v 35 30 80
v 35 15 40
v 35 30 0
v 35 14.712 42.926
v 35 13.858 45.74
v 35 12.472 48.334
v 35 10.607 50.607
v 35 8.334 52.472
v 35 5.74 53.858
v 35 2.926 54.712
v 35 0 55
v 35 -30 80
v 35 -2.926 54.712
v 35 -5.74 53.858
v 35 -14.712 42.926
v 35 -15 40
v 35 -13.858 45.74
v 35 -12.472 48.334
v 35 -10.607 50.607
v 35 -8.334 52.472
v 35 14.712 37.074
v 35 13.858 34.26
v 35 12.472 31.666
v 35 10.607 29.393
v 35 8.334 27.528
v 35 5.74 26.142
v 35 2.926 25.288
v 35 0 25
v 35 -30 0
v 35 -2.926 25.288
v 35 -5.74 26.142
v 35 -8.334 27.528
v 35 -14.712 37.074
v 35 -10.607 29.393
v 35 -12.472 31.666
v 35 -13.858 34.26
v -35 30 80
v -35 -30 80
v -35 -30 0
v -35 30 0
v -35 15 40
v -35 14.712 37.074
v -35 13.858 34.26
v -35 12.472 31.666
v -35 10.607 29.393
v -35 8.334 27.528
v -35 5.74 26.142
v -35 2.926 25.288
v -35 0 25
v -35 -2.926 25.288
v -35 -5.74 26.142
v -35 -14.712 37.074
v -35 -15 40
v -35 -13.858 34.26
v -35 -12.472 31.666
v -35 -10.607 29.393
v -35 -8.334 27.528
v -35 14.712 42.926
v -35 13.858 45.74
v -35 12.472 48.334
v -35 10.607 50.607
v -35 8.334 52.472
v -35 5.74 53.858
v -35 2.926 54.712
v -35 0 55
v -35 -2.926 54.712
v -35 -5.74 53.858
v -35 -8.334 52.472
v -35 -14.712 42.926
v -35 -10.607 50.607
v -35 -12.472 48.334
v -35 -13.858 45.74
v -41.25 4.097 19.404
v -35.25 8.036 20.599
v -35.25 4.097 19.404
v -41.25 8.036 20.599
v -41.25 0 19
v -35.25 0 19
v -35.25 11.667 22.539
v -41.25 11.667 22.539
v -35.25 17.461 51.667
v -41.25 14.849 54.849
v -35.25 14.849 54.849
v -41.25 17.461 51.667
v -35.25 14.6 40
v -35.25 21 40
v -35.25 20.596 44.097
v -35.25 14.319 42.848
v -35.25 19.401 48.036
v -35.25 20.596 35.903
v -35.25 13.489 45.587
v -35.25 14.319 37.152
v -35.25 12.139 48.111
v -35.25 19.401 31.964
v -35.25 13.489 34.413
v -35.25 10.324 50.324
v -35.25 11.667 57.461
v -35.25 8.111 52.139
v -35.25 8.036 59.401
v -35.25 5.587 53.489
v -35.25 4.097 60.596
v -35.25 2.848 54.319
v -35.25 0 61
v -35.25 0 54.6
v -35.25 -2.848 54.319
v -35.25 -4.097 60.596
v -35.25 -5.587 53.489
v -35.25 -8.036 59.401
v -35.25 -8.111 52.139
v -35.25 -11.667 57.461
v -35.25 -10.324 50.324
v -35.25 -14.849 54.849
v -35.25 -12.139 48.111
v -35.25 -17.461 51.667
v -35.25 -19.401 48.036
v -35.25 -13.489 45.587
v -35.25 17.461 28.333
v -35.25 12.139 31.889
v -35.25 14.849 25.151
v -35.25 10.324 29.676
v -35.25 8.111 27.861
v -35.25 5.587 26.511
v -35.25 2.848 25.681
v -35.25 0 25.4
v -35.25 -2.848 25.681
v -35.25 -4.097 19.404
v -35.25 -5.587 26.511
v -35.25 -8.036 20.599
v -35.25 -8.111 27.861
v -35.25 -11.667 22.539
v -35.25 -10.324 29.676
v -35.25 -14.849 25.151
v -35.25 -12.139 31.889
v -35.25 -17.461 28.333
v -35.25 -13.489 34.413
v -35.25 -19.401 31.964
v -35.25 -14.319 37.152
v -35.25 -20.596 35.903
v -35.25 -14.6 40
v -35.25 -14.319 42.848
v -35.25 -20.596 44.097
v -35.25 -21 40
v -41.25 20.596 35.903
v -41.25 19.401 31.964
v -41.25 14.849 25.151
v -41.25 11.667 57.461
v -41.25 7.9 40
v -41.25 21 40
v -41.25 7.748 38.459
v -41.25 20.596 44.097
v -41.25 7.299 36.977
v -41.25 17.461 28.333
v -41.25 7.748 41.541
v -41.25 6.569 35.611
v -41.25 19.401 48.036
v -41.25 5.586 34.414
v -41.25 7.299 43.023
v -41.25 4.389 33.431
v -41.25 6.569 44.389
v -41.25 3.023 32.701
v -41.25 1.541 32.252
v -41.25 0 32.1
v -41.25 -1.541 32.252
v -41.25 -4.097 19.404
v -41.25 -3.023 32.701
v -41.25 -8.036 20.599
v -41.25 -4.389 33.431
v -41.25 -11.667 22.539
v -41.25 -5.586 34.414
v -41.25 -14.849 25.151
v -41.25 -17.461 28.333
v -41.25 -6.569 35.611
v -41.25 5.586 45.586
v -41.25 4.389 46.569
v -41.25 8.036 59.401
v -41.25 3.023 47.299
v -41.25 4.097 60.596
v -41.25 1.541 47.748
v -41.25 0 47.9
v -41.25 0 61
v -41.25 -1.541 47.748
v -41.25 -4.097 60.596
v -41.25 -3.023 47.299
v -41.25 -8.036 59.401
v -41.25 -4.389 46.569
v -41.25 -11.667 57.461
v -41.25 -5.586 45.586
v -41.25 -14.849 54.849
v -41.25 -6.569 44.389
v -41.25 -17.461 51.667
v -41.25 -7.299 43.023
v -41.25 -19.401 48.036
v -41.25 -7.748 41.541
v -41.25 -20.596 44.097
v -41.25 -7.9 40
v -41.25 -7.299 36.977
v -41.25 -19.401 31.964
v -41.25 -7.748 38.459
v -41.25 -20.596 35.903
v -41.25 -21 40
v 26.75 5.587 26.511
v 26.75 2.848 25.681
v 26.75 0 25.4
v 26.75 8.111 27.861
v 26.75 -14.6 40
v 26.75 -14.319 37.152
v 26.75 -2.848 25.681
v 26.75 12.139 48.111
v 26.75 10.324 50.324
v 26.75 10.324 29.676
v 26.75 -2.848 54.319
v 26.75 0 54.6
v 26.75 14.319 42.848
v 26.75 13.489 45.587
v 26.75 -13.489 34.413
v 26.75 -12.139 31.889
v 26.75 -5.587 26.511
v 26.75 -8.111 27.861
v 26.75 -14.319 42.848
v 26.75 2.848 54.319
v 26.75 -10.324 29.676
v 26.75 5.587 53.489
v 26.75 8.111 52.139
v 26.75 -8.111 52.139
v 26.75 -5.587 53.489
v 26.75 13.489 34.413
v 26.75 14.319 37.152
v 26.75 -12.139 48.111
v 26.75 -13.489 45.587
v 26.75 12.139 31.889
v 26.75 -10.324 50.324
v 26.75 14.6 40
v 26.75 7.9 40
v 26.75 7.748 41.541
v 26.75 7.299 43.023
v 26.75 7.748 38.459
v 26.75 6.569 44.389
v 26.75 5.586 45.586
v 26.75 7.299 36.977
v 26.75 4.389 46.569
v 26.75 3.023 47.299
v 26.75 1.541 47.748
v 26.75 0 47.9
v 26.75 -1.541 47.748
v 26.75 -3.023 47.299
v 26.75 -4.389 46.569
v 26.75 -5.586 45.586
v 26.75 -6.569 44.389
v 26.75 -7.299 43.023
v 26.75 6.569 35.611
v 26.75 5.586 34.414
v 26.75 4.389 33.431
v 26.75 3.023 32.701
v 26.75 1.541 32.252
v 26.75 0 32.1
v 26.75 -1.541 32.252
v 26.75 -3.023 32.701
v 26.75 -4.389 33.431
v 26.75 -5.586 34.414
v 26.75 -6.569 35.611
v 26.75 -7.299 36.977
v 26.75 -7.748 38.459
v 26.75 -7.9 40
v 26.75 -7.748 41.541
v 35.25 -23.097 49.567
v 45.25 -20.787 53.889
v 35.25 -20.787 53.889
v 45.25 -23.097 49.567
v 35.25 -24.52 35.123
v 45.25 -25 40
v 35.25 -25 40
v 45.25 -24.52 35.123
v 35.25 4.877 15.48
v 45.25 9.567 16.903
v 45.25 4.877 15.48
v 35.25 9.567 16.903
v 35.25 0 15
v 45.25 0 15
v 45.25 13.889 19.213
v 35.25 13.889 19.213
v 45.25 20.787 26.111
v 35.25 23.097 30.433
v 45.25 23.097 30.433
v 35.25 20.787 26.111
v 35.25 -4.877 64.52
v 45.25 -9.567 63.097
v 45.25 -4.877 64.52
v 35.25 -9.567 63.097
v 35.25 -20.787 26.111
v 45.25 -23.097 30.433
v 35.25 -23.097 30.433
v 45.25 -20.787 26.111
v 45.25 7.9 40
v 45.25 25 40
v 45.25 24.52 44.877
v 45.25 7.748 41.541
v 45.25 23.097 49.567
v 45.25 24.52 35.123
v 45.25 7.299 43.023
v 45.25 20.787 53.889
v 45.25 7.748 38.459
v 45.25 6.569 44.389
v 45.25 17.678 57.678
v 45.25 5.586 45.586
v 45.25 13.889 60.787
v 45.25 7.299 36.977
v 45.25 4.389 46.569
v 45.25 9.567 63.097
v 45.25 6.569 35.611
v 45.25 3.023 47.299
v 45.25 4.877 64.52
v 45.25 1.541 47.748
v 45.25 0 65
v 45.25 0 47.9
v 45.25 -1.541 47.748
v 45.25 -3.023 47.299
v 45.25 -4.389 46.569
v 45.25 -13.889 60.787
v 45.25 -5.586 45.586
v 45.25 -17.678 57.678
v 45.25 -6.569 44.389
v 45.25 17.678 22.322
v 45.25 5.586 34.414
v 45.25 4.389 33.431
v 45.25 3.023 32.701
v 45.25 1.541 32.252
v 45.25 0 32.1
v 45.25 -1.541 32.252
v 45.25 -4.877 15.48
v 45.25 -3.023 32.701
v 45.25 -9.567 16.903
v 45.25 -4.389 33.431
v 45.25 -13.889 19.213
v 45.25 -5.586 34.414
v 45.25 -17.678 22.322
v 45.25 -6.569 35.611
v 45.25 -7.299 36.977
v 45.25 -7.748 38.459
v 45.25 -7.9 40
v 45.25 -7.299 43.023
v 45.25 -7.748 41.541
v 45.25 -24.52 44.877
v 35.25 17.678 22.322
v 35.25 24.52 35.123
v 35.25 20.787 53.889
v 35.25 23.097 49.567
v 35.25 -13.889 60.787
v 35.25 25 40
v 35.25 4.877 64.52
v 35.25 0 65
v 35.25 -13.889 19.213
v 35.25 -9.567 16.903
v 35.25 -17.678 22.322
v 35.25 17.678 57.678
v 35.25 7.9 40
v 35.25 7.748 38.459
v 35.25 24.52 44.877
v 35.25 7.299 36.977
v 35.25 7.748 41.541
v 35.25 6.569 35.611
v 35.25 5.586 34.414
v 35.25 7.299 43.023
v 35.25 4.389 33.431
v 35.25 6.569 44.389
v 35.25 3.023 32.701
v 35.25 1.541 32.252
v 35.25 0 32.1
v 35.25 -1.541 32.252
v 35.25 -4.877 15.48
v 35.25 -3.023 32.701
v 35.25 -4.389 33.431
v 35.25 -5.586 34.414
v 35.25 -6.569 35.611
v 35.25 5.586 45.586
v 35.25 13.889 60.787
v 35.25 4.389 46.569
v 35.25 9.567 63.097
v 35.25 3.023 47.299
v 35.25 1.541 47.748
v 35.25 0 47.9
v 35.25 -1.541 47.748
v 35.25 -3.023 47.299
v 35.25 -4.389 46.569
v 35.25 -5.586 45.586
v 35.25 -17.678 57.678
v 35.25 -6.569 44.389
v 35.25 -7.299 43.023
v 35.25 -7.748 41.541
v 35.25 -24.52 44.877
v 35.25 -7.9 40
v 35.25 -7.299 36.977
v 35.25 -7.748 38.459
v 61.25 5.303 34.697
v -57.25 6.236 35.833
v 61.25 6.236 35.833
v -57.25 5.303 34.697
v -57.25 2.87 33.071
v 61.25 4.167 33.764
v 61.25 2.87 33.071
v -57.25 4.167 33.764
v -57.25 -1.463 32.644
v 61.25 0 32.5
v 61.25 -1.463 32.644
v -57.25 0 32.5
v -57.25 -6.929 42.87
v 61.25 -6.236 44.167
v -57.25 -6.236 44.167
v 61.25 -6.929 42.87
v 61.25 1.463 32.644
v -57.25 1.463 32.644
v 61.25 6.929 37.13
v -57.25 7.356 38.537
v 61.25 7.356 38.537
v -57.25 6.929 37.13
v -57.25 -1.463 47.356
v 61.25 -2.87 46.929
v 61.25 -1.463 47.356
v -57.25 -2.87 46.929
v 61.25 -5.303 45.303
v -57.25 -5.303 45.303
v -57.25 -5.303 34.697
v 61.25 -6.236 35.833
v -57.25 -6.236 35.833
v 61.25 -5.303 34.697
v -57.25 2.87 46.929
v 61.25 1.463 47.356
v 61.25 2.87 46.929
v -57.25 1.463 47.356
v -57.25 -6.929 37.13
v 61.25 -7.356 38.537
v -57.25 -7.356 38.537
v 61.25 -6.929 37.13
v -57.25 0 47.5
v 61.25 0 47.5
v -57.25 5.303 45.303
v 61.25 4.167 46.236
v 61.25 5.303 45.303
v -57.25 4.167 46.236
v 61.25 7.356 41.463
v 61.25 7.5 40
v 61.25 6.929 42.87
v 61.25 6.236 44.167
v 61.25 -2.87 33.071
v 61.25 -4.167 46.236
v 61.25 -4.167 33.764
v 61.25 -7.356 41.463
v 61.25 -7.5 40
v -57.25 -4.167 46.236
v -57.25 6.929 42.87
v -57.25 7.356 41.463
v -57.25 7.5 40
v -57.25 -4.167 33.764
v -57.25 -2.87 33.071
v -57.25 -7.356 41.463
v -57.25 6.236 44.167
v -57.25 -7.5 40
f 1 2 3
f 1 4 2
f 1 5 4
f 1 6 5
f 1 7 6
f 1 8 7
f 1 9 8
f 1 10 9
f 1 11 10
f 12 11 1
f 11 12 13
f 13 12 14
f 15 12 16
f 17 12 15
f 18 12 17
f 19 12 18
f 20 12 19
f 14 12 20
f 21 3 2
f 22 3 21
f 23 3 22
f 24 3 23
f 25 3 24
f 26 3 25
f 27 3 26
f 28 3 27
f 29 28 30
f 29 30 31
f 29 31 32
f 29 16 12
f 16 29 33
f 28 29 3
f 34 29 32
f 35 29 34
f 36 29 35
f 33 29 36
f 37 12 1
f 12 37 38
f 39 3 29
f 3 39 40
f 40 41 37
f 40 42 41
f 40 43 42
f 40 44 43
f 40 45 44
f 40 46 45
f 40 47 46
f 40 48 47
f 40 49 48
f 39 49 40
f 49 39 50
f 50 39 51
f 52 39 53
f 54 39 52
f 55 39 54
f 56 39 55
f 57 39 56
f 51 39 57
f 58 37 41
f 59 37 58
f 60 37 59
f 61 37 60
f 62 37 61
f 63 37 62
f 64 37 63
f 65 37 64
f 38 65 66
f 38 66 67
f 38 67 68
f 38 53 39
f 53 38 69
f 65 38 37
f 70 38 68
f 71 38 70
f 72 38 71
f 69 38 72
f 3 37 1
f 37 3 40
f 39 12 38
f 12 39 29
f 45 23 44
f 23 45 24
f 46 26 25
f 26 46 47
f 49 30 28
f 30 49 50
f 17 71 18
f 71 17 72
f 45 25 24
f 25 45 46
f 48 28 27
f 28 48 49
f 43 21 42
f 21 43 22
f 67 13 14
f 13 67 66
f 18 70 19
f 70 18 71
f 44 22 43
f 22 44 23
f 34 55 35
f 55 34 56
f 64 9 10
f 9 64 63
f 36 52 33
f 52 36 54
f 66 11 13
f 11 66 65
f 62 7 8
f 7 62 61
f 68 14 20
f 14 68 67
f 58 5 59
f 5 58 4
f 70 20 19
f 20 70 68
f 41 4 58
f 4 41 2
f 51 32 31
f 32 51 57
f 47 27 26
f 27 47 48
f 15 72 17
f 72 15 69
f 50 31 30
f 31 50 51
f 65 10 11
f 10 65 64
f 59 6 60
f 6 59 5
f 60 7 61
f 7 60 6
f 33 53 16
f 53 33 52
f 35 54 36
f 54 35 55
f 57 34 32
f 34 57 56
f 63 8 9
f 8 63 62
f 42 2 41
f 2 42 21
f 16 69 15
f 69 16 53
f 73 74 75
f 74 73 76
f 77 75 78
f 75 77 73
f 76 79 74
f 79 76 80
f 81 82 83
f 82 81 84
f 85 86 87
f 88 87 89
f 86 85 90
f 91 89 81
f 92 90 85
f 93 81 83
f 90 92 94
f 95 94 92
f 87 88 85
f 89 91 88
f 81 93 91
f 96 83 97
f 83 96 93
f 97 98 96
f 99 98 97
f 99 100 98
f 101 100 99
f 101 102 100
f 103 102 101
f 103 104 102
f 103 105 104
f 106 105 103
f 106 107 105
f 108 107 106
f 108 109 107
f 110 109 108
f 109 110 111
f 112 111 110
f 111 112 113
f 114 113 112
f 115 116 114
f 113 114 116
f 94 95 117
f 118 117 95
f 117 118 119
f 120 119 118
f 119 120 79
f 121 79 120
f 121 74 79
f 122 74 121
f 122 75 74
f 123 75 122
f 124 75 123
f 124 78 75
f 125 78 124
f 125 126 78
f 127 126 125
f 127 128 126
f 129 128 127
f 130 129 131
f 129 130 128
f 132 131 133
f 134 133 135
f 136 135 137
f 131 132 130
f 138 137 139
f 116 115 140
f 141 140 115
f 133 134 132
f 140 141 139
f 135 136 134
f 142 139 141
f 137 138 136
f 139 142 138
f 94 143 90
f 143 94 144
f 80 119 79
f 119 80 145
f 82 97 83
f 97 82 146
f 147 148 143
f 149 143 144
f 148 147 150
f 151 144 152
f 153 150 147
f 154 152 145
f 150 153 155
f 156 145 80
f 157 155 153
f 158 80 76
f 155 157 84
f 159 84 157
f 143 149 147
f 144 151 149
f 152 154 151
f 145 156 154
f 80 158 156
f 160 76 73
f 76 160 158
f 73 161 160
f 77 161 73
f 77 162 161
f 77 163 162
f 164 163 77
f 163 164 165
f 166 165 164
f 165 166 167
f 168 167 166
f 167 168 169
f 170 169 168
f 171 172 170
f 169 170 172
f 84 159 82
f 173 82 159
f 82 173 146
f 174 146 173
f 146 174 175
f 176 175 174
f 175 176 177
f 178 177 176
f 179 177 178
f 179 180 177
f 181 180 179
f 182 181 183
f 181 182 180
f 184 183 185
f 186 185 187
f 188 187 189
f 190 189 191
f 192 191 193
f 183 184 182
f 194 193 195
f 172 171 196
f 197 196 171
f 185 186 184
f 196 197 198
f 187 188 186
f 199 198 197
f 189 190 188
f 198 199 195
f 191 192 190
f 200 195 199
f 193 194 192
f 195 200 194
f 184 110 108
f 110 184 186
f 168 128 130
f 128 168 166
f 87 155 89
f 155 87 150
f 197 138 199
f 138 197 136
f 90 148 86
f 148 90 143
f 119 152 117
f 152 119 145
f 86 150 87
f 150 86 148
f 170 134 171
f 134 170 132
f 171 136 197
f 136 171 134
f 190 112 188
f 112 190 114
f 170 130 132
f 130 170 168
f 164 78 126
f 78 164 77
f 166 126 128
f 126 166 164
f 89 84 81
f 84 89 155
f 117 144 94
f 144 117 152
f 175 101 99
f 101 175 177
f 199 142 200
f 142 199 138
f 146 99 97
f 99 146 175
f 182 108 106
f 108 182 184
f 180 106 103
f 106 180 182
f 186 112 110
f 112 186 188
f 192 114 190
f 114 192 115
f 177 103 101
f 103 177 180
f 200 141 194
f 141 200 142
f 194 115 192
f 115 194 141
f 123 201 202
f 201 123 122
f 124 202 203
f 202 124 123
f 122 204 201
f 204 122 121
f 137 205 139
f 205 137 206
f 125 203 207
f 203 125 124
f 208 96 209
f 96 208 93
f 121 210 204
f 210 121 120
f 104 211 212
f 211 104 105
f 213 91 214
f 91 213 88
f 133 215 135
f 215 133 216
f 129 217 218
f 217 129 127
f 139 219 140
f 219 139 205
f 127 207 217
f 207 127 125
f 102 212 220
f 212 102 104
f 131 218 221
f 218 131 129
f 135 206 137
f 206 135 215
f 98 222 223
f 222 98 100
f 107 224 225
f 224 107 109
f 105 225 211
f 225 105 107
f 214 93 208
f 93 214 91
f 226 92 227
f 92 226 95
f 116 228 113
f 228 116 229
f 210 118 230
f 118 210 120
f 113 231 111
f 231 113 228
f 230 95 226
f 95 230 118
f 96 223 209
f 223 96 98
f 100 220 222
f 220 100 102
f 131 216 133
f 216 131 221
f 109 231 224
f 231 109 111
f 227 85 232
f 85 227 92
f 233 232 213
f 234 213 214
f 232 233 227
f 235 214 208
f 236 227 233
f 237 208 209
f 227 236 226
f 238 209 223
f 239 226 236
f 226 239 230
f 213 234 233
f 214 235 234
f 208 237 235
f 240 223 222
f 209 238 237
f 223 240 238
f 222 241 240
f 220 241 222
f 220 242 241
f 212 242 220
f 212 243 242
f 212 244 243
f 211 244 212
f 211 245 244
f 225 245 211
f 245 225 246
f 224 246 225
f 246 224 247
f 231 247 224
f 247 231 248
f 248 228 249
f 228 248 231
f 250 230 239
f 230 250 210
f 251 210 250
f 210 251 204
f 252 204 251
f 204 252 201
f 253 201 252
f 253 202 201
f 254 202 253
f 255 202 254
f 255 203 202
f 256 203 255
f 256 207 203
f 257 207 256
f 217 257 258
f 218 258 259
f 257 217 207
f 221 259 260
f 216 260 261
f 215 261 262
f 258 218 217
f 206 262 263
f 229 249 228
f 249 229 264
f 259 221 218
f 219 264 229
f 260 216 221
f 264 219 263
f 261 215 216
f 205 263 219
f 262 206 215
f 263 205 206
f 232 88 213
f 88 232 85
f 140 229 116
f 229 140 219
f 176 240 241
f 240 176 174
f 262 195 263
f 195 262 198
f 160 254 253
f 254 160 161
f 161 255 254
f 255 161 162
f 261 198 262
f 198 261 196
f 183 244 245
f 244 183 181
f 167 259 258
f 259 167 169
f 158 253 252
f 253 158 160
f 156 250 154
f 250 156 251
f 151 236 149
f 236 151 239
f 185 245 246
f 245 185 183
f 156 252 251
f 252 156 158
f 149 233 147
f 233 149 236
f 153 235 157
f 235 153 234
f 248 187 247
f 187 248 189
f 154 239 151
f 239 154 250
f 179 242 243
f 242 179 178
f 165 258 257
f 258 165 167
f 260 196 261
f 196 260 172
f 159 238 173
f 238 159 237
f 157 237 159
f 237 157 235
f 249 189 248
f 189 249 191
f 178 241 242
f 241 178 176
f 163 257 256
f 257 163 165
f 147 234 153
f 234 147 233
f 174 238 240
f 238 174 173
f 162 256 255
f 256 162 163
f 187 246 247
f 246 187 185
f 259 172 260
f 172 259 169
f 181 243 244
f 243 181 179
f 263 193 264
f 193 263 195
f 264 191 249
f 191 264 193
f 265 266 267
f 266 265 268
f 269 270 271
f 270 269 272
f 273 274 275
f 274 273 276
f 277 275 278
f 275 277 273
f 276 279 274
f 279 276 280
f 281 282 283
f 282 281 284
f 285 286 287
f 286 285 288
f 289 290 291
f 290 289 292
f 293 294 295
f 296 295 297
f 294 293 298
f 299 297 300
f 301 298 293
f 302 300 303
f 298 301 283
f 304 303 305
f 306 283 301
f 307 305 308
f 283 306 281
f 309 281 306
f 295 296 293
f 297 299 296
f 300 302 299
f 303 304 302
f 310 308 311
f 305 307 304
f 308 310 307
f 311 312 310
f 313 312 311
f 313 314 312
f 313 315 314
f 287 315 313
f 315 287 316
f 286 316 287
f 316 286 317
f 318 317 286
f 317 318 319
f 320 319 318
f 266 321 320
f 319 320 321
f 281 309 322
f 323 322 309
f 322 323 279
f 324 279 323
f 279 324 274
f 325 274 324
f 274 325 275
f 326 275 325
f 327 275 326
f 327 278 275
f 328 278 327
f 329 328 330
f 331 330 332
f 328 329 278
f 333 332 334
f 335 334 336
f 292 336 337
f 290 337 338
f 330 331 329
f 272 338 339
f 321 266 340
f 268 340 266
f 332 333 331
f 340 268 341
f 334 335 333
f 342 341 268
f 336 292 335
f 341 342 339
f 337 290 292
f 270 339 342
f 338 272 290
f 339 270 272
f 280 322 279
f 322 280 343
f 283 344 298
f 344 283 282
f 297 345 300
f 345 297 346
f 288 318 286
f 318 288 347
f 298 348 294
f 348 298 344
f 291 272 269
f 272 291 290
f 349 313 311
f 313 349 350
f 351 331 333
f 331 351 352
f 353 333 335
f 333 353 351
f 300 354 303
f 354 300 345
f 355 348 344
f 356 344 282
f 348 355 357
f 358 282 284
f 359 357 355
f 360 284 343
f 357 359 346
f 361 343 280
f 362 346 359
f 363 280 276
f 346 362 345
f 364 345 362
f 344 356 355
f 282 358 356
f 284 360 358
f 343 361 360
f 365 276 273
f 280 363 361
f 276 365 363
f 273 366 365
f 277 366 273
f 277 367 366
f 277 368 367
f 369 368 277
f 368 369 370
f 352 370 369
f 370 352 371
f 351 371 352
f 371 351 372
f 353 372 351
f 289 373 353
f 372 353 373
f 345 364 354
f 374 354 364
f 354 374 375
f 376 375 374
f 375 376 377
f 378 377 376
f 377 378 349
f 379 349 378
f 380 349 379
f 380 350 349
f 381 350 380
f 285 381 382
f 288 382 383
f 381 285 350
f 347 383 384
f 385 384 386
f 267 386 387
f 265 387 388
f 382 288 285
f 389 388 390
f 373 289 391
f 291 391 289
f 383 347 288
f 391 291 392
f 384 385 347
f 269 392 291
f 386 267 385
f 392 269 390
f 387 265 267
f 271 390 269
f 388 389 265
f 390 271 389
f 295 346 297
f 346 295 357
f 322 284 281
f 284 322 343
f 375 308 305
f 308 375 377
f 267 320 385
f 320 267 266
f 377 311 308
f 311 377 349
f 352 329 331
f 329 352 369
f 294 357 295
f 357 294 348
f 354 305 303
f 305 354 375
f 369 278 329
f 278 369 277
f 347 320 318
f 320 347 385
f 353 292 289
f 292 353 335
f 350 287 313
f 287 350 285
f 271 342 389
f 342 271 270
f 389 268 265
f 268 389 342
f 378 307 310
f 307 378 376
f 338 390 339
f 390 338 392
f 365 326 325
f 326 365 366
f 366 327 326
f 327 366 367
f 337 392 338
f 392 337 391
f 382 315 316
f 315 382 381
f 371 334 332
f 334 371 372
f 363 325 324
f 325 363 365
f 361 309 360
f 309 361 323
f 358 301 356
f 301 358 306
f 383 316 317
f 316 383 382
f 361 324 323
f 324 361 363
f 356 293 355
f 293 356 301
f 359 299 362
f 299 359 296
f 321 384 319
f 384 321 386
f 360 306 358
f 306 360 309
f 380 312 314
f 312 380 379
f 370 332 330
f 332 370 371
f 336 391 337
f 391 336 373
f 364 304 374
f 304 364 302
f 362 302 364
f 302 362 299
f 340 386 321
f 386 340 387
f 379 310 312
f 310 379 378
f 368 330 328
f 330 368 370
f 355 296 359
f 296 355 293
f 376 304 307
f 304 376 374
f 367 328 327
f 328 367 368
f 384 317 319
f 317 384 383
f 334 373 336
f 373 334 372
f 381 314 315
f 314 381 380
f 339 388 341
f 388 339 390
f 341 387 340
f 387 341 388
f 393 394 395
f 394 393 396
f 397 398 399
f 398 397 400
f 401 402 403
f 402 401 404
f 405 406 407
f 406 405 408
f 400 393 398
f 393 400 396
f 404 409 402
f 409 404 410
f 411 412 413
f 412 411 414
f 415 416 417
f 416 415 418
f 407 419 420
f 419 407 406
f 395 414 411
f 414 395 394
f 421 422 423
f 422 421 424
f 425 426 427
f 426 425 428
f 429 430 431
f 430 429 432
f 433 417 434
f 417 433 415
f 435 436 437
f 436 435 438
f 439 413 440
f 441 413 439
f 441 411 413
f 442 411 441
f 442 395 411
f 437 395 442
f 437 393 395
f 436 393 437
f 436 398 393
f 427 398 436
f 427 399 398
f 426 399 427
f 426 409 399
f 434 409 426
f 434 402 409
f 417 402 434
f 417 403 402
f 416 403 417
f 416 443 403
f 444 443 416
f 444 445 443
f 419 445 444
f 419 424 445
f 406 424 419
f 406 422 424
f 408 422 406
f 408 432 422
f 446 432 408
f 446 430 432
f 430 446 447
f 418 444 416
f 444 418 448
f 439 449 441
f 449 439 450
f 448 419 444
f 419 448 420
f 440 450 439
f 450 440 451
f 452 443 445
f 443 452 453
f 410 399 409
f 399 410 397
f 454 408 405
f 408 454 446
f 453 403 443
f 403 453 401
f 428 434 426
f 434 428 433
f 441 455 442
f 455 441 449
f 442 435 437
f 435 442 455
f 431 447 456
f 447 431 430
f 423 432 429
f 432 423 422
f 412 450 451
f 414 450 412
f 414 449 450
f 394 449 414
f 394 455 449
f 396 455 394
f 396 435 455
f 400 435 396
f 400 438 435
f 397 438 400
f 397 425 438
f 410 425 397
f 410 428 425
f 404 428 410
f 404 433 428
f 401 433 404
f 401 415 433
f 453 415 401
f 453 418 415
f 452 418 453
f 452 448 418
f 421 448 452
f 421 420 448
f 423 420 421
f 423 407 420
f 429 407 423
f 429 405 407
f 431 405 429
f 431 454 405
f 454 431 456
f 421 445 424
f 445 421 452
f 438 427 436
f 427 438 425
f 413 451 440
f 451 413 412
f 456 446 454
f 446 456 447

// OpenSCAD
$fn = 32;

// ------------------------------------------------------------------------
// Bushed housing: 70 x 60 x 80 mm housing, bushing d29.2
// Every part is its own module, assembly() places them once.
// ------------------------------------------------------------------------

// --- part 1 ---
module housing() {
  difference() {
    translate([-35, -30, 0]) cube([70, 60, 80]);
    translate([0, 0, 40]) rotate([0, 90, 0]) cylinder(h = 72, d = 30, center = true);
  }
}

// --- part 2 ---
module bushing() {
  difference() {
    union() {
      cylinder(h = 6, d = 42);
      translate([0, 0, 6]) cylinder(h = 62, d = 29.2);
    }
    translate([0, 0, -1]) cylinder(h = 70, d = 15.8);
  }
}

// --- part 3 ---
module shaft() {
  translate([0, 0, -59.25]) cylinder(h = 118.5, d = 15);
}

// --- part 4 ---
module cover() {
  difference() {
    cylinder(h = 10, d = 50);
    translate([0, 0, -1]) cylinder(h = 12, d = 15.8);
  }
}

// --- assembly ---
module assembly() {
  translate([0, 0, 0]) rotate([0, 0, 0]) housing();
  translate([-41.25, 0, 40]) rotate([0, 90, 0]) bushing();
  translate([2, 0, 40]) rotate([0, 90, 0]) shaft();
  translate([35.25, 0, 40]) rotate([0, 90, 0]) cover();
}

assembly();
